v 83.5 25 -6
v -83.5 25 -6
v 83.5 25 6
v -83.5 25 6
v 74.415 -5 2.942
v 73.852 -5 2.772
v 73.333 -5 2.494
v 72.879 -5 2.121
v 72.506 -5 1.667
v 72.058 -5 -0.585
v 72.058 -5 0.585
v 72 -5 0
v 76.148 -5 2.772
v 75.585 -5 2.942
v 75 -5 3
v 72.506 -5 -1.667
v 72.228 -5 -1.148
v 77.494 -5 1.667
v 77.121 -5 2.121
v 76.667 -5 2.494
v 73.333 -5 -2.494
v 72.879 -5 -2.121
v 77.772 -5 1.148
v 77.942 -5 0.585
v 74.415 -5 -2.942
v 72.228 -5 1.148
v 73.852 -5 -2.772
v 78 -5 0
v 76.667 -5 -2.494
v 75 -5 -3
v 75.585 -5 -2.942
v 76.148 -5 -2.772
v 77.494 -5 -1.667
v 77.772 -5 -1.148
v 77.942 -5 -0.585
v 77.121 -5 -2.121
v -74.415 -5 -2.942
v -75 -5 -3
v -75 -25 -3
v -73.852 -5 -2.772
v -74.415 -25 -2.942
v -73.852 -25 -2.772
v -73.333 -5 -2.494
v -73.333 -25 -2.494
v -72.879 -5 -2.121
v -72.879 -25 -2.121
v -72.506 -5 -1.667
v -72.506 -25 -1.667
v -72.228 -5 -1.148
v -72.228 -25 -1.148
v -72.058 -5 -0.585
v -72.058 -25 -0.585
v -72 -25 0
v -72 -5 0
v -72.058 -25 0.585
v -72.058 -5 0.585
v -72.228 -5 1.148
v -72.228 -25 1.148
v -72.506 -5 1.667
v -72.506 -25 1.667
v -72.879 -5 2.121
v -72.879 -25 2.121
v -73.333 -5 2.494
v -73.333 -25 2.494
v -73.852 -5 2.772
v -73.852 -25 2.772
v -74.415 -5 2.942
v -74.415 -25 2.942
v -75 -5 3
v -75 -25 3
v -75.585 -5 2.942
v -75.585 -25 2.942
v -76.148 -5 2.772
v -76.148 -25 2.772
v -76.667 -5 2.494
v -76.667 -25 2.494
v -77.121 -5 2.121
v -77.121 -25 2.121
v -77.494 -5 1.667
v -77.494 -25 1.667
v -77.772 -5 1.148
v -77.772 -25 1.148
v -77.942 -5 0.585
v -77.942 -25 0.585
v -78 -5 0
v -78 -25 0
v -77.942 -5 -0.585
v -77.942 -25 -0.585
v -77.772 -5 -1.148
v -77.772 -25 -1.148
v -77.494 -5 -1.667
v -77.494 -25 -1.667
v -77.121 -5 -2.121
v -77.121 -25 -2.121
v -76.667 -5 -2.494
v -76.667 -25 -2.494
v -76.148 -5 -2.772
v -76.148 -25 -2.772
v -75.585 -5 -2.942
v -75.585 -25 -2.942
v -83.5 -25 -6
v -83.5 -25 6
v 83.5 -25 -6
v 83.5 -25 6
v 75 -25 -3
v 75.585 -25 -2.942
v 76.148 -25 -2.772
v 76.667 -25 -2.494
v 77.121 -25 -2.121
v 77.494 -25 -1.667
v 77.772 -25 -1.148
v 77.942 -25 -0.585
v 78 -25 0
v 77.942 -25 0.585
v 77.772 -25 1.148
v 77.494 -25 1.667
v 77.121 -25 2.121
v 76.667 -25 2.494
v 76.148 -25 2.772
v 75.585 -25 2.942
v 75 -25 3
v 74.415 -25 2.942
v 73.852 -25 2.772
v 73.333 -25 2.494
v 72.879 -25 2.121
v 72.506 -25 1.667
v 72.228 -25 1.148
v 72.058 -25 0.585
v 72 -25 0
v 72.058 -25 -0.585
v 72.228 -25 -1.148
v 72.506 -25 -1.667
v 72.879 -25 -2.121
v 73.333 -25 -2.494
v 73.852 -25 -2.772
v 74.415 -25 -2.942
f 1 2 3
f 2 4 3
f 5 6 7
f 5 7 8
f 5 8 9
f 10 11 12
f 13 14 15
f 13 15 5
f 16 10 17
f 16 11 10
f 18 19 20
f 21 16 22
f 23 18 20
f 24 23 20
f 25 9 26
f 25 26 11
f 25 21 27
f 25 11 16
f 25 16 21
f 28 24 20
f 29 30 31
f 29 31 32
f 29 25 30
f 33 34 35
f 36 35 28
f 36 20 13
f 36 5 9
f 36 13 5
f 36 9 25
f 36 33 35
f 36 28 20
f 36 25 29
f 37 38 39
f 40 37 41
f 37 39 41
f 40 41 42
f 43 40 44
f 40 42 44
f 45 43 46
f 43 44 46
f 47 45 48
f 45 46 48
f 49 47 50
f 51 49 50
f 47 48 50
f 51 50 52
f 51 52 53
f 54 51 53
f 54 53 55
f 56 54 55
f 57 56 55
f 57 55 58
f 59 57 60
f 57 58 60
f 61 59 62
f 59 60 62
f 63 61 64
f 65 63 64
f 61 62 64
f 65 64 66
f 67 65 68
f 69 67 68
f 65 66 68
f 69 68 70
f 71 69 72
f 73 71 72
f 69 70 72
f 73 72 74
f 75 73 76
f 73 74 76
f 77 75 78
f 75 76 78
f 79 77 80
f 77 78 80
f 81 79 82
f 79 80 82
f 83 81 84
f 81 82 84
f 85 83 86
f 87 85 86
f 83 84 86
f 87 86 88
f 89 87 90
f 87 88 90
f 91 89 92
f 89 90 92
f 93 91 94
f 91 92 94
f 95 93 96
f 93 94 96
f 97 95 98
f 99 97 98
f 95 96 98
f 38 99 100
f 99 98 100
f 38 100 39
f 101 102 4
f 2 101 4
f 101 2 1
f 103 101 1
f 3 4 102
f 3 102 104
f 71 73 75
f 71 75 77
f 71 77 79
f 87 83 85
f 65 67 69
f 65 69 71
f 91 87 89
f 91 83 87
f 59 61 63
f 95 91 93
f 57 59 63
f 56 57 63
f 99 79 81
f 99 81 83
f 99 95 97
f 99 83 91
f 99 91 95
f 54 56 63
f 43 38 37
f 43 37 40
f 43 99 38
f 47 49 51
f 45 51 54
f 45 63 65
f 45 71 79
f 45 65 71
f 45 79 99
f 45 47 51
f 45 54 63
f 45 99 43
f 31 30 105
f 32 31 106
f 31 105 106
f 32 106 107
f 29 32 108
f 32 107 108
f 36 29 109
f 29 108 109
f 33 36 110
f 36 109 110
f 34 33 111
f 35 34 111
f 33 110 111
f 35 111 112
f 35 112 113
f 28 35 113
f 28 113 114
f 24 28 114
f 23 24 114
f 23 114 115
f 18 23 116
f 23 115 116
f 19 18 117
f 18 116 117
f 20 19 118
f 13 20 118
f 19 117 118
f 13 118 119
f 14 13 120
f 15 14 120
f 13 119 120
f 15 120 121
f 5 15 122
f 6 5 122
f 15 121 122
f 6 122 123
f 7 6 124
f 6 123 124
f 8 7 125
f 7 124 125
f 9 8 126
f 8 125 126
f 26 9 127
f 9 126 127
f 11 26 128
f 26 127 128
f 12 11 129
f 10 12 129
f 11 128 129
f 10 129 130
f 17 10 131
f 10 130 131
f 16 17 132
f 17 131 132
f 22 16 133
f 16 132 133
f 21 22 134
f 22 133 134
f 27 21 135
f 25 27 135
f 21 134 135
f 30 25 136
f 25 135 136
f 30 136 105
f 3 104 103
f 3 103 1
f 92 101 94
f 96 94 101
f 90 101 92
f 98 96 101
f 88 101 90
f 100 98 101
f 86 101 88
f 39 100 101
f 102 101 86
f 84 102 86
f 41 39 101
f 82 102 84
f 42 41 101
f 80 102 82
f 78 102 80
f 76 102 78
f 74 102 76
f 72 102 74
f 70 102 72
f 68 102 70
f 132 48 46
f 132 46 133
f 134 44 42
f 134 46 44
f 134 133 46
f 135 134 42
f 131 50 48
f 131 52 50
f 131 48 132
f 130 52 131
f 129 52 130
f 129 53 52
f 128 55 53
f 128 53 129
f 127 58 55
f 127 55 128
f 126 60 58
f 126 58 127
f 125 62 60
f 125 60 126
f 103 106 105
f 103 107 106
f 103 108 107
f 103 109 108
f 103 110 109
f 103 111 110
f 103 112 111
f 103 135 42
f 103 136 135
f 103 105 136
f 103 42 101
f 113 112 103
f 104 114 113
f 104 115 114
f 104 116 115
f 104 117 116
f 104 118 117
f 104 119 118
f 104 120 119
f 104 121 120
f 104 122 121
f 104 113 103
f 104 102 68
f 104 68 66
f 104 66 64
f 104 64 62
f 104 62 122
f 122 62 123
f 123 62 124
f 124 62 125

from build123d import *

# Parameters (mm, degrees)
ESBO_O1_W                = 167
ESBO_O1_H                = 50
RESSALTO_EXTRUS_O1_DEPTH = 6
ESBO_O3_R                = 3
CORTE_EXTRUS_O1_DEPTH    = 20


with BuildPart() as part:
    # Esboço1 → Ressalto-extrusão1 (new, symmetric)
    with BuildSketch(Plane.XY):
        Rectangle(ESBO_O1_W, ESBO_O1_H)
    extrude(amount=RESSALTO_EXTRUS_O1_DEPTH, both=True)

    # Esboço3 → Corte-extrusão1 (cut)
    with BuildSketch(Plane(origin=(0, -25, 0), x_dir=(-1, 0, 0), z_dir=(0, -1, 0))):
        with Locations(Location((75, 0, 0), (0, 0, 90))):
            Circle(ESBO_O3_R)
        with Locations(Location((-75, 0, 0), (0, 0, 90))):
            Circle(ESBO_O3_R)
    extrude(amount=-CORTE_EXTRUS_O1_DEPTH, mode=Mode.SUBTRACT)


solid = part.part
